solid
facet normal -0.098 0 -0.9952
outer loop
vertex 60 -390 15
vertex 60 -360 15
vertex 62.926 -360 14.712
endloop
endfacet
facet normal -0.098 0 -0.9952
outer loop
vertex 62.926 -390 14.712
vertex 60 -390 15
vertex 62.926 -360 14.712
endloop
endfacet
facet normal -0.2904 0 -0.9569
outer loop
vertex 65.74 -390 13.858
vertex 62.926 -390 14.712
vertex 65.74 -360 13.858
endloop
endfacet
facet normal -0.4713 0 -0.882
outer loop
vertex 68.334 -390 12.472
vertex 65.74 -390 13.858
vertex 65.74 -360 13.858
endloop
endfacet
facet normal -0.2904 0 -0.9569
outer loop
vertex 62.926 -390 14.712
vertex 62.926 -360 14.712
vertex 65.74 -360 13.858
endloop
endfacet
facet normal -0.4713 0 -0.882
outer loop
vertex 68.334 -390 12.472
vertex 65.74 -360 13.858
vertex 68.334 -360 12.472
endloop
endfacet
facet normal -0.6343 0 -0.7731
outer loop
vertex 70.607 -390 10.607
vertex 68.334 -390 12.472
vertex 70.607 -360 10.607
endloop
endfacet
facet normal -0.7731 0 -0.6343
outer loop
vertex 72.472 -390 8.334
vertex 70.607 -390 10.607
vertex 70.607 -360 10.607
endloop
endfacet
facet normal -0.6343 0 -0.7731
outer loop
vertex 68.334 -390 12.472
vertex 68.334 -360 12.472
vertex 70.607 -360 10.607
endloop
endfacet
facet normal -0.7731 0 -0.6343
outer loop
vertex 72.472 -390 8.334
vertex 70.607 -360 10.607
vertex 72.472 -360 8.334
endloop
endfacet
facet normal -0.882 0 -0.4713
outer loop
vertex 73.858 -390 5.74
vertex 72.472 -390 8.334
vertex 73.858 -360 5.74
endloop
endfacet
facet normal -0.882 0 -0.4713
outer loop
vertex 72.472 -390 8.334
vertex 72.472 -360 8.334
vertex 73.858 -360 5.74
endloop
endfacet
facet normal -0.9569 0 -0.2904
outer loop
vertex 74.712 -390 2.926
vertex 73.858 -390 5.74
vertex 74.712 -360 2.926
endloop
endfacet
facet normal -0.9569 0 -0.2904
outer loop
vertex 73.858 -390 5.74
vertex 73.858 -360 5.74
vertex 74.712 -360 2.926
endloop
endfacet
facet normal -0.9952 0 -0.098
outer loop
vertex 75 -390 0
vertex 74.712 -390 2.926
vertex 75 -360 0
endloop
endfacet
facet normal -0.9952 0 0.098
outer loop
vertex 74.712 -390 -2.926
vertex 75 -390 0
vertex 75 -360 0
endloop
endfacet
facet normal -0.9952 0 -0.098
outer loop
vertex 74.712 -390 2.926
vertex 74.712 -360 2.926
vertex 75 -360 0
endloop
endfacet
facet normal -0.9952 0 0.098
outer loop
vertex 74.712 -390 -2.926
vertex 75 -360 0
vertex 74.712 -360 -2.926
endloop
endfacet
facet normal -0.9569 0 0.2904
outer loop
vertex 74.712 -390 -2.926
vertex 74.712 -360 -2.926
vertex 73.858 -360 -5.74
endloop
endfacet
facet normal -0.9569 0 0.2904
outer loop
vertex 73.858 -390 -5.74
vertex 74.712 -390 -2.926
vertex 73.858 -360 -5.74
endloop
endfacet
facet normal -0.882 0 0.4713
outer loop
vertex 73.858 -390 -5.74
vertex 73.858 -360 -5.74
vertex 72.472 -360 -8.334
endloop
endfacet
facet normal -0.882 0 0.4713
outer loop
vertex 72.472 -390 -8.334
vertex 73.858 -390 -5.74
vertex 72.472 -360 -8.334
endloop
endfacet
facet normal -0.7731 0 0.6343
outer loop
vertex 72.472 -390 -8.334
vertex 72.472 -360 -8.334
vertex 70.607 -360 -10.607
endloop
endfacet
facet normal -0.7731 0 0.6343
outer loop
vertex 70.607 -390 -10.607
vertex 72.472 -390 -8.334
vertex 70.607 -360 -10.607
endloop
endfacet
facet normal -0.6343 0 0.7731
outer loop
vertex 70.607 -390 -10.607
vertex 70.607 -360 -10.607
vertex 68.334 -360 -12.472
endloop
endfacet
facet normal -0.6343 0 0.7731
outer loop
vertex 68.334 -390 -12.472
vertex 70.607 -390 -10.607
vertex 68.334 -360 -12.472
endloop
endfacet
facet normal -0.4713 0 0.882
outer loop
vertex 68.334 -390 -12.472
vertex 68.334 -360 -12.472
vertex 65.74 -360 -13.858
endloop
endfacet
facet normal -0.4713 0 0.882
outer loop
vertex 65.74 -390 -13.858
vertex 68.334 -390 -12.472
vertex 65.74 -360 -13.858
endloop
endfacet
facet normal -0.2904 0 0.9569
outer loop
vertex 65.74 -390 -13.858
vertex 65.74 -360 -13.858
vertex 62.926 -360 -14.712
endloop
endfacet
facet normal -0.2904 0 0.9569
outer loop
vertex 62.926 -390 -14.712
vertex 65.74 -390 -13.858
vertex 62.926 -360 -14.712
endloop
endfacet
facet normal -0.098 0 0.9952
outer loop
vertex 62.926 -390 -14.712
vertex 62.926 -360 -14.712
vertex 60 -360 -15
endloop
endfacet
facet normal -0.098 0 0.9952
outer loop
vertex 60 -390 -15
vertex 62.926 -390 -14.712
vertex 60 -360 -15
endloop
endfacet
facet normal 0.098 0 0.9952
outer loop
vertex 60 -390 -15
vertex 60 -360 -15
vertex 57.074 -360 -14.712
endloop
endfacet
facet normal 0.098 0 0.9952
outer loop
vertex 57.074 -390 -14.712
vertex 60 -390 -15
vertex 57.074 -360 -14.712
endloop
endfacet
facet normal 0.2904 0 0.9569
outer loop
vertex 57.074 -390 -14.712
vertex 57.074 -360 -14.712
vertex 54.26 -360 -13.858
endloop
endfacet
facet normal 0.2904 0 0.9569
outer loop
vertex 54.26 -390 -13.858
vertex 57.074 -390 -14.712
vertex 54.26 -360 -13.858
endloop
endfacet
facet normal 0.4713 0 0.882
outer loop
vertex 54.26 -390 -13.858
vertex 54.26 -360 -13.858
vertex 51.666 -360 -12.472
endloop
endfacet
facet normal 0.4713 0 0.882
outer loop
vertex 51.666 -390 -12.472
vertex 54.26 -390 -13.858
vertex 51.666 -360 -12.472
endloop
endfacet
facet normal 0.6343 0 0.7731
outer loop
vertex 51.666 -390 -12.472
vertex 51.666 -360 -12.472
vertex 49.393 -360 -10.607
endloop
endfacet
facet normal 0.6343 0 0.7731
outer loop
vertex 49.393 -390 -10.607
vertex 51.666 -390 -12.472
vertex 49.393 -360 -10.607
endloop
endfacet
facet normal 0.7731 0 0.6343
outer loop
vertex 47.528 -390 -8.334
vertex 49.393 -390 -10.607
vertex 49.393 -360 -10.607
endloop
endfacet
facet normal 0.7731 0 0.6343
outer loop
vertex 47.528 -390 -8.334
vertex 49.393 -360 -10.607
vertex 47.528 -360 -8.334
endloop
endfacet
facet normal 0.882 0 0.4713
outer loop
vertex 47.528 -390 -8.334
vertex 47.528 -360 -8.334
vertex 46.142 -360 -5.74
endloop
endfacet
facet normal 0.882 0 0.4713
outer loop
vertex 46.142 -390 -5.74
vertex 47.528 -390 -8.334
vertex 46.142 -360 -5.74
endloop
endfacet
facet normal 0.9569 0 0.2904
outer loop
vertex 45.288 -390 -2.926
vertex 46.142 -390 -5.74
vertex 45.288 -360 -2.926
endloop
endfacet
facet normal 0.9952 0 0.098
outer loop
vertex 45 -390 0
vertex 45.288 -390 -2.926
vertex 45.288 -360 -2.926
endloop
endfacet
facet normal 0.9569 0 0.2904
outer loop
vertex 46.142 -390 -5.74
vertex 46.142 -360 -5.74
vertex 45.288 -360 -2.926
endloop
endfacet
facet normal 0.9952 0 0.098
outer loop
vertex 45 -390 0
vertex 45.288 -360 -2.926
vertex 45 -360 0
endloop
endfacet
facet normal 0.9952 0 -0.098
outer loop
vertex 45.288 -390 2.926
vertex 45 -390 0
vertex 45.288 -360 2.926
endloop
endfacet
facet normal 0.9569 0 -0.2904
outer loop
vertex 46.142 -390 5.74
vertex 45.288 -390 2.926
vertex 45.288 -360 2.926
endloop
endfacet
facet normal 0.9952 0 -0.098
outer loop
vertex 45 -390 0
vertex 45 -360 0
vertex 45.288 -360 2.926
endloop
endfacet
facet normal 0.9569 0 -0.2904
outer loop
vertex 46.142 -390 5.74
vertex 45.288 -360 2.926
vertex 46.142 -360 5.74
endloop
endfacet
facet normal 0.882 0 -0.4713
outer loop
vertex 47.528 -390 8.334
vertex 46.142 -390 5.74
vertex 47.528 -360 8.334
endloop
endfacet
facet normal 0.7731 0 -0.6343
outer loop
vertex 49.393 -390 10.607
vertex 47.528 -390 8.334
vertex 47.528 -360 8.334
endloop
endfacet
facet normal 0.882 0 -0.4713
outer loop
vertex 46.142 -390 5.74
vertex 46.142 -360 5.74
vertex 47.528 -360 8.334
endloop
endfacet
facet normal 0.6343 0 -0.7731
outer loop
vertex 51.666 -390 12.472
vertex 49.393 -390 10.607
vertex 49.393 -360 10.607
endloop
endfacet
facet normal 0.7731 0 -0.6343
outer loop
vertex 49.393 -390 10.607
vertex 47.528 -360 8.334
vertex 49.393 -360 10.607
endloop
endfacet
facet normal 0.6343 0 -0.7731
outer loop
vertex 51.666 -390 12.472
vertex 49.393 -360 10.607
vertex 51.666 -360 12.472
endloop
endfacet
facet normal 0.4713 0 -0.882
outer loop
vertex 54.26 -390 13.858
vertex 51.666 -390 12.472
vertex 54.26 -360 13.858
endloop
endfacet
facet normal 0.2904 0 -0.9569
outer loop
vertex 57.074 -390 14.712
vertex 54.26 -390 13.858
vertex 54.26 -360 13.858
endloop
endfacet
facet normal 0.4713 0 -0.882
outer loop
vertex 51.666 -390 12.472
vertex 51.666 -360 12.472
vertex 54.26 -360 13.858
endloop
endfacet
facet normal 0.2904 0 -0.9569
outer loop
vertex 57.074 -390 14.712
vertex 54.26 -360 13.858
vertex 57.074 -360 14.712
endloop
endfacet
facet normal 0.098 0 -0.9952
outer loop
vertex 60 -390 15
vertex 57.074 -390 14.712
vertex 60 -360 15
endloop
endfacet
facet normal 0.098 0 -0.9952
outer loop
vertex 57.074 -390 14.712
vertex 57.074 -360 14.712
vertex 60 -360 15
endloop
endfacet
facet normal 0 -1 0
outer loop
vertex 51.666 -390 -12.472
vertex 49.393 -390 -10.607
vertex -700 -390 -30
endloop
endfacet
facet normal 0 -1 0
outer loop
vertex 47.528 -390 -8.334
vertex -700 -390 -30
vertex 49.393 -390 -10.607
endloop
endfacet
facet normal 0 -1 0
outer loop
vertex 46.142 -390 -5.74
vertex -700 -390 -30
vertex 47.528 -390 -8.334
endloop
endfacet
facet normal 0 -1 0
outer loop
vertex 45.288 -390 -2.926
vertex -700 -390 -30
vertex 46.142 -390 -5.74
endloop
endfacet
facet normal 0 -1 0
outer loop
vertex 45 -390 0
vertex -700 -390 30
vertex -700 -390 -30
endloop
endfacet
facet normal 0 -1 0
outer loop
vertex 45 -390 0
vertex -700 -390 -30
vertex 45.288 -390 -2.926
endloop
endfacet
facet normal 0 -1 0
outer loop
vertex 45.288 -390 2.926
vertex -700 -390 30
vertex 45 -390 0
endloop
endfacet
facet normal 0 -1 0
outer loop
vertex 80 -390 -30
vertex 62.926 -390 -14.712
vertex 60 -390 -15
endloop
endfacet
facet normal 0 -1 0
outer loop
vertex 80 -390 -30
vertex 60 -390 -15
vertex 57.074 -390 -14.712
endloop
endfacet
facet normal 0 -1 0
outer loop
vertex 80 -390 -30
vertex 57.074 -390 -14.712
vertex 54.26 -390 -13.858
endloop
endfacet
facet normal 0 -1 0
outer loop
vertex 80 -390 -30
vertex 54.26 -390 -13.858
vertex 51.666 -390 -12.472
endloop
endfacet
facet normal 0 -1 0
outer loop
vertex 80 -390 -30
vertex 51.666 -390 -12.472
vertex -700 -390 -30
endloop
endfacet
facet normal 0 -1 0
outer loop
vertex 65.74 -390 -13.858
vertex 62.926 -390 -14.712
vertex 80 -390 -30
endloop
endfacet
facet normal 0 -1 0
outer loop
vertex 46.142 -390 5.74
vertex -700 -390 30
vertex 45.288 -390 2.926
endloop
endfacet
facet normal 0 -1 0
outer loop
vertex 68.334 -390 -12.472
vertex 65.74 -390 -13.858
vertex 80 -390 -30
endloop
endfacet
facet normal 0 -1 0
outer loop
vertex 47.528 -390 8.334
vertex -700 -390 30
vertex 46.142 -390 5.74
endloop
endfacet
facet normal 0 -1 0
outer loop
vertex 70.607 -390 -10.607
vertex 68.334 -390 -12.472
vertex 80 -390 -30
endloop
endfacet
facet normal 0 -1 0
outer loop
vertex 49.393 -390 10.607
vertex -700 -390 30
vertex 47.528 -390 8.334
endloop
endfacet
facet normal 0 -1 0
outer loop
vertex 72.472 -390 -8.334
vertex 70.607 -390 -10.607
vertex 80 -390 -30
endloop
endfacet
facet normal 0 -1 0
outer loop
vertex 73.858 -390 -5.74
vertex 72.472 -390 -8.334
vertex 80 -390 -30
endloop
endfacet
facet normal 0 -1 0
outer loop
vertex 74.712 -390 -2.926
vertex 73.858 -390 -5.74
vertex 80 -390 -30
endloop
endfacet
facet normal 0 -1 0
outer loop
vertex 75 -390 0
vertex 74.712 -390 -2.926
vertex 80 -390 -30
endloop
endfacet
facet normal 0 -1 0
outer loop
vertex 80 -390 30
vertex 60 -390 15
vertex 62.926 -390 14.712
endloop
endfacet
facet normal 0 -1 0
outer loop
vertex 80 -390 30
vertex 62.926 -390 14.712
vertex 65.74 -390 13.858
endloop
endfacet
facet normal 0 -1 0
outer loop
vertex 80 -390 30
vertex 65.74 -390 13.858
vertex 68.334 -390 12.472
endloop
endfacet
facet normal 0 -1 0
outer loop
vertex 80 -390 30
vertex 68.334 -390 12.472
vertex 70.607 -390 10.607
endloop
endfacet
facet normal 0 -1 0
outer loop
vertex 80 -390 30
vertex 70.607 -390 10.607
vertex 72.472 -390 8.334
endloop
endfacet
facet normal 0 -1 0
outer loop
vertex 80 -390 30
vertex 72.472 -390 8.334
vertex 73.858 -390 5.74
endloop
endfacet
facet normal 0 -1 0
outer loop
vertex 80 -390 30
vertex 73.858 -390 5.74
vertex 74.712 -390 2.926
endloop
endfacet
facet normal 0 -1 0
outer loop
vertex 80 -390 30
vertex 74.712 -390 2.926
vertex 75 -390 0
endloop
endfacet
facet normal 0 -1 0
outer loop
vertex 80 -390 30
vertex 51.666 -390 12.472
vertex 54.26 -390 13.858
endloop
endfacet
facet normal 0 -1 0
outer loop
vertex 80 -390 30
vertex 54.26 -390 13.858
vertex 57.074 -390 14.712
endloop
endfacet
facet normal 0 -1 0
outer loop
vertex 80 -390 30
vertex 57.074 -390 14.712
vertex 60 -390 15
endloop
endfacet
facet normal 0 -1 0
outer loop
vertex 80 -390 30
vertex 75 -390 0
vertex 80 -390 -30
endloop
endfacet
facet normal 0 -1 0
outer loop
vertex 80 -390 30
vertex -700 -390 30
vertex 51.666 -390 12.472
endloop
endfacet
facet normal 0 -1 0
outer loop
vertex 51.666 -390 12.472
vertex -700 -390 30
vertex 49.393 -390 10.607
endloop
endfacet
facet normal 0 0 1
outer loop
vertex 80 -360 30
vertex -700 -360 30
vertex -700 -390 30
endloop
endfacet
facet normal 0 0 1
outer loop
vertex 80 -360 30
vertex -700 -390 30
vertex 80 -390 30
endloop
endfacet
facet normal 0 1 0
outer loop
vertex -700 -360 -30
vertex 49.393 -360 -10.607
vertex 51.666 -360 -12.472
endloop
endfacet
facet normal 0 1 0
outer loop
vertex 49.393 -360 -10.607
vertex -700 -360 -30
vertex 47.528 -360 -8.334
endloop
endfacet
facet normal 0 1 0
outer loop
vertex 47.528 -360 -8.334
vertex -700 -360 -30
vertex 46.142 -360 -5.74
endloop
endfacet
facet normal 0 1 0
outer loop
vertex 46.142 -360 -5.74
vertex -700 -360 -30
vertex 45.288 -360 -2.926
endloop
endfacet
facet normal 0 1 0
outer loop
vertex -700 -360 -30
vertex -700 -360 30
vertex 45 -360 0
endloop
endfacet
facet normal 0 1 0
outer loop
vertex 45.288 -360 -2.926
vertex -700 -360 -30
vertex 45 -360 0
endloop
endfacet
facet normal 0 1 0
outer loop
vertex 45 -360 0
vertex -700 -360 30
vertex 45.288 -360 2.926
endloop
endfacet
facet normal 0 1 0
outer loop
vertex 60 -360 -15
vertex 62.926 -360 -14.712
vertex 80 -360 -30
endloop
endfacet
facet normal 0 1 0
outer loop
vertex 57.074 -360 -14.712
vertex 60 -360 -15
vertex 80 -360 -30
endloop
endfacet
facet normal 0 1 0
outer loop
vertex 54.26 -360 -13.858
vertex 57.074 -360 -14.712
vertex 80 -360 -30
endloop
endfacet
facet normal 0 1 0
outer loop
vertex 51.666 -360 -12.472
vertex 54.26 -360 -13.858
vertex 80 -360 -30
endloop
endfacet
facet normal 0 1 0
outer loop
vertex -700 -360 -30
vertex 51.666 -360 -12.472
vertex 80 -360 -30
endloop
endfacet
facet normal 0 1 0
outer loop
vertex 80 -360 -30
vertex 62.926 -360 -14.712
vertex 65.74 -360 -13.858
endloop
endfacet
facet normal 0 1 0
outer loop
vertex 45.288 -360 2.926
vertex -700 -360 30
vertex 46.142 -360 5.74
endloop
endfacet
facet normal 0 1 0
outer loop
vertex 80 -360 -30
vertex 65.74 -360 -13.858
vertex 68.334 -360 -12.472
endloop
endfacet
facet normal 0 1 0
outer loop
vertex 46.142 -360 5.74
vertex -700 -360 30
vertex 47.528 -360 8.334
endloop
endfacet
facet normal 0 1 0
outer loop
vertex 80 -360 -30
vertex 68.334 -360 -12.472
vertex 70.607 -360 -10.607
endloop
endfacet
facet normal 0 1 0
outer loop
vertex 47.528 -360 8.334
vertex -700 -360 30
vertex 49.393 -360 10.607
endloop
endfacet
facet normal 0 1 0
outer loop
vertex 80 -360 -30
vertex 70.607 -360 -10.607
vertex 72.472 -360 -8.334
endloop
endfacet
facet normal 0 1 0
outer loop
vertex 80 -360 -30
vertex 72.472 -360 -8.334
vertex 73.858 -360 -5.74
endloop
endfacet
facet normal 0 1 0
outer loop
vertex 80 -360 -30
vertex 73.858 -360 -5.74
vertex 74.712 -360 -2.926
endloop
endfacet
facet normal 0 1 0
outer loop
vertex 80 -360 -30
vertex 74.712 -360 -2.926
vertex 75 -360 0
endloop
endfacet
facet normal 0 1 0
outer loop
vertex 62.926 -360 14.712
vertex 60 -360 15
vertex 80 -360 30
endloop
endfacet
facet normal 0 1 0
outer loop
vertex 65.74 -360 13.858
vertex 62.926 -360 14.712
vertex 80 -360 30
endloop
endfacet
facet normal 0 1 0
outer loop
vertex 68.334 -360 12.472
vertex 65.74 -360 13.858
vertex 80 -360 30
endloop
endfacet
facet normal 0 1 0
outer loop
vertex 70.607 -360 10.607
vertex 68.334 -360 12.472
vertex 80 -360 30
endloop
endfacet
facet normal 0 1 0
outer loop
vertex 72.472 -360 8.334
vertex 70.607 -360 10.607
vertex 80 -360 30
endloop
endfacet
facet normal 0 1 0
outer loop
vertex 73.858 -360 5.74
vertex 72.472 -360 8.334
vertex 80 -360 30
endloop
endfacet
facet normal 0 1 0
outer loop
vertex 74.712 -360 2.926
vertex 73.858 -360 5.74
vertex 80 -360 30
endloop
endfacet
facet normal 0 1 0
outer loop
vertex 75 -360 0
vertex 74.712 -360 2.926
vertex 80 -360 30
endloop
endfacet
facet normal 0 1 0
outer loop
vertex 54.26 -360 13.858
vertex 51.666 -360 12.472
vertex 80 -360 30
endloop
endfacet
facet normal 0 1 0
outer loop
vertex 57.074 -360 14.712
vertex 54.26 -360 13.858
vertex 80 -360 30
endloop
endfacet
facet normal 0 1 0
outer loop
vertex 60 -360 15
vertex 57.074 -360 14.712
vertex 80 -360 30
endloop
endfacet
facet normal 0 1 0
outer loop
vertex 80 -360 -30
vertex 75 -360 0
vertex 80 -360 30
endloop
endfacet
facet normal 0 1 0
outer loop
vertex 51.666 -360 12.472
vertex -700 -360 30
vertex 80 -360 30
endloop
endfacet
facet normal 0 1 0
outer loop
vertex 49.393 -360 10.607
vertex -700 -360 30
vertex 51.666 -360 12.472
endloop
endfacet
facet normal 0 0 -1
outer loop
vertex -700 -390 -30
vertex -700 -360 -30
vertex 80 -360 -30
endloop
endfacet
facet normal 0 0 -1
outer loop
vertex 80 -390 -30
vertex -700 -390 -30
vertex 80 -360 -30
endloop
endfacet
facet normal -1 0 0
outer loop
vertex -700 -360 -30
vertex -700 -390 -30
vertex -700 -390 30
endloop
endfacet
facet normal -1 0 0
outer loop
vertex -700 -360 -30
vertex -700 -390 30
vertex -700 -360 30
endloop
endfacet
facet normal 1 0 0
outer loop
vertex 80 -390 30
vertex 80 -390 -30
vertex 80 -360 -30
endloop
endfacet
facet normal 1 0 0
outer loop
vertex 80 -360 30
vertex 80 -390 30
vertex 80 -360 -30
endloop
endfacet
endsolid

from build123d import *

# Parameters (mm, degrees)
ESQUISSE1_W             = 780
ESQUISSE1_H             = 30
BASE_EXTRUSION_DEPTH    = 30
ESQUISSE3_R             = 15
ENL_V_MAT_EXTRU_1_DEPTH = 702.284535691


with BuildPart() as part:
    # Esquisse1 → Base-Extrusion (new, symmetric)
    with BuildSketch(Plane.XY):
        with Locations((-310, -375)):
            Rectangle(ESQUISSE1_W, ESQUISSE1_H)
    extrude(amount=BASE_EXTRUSION_DEPTH, both=True)

    # Esquisse3 → Enlèv. mat.-Extru.1 (cut, through all)
    with BuildSketch(Plane(origin=(0, -360, 0), x_dir=(-1, 0, 0), z_dir=(0, 1, 0))):
        with Locations(Location((-60, 0, 0), (0, 0, 90))):
            Circle(ESQUISSE3_R)
    extrude(amount=-ENL_V_MAT_EXTRU_1_DEPTH, mode=Mode.SUBTRACT)


solid = part.part
